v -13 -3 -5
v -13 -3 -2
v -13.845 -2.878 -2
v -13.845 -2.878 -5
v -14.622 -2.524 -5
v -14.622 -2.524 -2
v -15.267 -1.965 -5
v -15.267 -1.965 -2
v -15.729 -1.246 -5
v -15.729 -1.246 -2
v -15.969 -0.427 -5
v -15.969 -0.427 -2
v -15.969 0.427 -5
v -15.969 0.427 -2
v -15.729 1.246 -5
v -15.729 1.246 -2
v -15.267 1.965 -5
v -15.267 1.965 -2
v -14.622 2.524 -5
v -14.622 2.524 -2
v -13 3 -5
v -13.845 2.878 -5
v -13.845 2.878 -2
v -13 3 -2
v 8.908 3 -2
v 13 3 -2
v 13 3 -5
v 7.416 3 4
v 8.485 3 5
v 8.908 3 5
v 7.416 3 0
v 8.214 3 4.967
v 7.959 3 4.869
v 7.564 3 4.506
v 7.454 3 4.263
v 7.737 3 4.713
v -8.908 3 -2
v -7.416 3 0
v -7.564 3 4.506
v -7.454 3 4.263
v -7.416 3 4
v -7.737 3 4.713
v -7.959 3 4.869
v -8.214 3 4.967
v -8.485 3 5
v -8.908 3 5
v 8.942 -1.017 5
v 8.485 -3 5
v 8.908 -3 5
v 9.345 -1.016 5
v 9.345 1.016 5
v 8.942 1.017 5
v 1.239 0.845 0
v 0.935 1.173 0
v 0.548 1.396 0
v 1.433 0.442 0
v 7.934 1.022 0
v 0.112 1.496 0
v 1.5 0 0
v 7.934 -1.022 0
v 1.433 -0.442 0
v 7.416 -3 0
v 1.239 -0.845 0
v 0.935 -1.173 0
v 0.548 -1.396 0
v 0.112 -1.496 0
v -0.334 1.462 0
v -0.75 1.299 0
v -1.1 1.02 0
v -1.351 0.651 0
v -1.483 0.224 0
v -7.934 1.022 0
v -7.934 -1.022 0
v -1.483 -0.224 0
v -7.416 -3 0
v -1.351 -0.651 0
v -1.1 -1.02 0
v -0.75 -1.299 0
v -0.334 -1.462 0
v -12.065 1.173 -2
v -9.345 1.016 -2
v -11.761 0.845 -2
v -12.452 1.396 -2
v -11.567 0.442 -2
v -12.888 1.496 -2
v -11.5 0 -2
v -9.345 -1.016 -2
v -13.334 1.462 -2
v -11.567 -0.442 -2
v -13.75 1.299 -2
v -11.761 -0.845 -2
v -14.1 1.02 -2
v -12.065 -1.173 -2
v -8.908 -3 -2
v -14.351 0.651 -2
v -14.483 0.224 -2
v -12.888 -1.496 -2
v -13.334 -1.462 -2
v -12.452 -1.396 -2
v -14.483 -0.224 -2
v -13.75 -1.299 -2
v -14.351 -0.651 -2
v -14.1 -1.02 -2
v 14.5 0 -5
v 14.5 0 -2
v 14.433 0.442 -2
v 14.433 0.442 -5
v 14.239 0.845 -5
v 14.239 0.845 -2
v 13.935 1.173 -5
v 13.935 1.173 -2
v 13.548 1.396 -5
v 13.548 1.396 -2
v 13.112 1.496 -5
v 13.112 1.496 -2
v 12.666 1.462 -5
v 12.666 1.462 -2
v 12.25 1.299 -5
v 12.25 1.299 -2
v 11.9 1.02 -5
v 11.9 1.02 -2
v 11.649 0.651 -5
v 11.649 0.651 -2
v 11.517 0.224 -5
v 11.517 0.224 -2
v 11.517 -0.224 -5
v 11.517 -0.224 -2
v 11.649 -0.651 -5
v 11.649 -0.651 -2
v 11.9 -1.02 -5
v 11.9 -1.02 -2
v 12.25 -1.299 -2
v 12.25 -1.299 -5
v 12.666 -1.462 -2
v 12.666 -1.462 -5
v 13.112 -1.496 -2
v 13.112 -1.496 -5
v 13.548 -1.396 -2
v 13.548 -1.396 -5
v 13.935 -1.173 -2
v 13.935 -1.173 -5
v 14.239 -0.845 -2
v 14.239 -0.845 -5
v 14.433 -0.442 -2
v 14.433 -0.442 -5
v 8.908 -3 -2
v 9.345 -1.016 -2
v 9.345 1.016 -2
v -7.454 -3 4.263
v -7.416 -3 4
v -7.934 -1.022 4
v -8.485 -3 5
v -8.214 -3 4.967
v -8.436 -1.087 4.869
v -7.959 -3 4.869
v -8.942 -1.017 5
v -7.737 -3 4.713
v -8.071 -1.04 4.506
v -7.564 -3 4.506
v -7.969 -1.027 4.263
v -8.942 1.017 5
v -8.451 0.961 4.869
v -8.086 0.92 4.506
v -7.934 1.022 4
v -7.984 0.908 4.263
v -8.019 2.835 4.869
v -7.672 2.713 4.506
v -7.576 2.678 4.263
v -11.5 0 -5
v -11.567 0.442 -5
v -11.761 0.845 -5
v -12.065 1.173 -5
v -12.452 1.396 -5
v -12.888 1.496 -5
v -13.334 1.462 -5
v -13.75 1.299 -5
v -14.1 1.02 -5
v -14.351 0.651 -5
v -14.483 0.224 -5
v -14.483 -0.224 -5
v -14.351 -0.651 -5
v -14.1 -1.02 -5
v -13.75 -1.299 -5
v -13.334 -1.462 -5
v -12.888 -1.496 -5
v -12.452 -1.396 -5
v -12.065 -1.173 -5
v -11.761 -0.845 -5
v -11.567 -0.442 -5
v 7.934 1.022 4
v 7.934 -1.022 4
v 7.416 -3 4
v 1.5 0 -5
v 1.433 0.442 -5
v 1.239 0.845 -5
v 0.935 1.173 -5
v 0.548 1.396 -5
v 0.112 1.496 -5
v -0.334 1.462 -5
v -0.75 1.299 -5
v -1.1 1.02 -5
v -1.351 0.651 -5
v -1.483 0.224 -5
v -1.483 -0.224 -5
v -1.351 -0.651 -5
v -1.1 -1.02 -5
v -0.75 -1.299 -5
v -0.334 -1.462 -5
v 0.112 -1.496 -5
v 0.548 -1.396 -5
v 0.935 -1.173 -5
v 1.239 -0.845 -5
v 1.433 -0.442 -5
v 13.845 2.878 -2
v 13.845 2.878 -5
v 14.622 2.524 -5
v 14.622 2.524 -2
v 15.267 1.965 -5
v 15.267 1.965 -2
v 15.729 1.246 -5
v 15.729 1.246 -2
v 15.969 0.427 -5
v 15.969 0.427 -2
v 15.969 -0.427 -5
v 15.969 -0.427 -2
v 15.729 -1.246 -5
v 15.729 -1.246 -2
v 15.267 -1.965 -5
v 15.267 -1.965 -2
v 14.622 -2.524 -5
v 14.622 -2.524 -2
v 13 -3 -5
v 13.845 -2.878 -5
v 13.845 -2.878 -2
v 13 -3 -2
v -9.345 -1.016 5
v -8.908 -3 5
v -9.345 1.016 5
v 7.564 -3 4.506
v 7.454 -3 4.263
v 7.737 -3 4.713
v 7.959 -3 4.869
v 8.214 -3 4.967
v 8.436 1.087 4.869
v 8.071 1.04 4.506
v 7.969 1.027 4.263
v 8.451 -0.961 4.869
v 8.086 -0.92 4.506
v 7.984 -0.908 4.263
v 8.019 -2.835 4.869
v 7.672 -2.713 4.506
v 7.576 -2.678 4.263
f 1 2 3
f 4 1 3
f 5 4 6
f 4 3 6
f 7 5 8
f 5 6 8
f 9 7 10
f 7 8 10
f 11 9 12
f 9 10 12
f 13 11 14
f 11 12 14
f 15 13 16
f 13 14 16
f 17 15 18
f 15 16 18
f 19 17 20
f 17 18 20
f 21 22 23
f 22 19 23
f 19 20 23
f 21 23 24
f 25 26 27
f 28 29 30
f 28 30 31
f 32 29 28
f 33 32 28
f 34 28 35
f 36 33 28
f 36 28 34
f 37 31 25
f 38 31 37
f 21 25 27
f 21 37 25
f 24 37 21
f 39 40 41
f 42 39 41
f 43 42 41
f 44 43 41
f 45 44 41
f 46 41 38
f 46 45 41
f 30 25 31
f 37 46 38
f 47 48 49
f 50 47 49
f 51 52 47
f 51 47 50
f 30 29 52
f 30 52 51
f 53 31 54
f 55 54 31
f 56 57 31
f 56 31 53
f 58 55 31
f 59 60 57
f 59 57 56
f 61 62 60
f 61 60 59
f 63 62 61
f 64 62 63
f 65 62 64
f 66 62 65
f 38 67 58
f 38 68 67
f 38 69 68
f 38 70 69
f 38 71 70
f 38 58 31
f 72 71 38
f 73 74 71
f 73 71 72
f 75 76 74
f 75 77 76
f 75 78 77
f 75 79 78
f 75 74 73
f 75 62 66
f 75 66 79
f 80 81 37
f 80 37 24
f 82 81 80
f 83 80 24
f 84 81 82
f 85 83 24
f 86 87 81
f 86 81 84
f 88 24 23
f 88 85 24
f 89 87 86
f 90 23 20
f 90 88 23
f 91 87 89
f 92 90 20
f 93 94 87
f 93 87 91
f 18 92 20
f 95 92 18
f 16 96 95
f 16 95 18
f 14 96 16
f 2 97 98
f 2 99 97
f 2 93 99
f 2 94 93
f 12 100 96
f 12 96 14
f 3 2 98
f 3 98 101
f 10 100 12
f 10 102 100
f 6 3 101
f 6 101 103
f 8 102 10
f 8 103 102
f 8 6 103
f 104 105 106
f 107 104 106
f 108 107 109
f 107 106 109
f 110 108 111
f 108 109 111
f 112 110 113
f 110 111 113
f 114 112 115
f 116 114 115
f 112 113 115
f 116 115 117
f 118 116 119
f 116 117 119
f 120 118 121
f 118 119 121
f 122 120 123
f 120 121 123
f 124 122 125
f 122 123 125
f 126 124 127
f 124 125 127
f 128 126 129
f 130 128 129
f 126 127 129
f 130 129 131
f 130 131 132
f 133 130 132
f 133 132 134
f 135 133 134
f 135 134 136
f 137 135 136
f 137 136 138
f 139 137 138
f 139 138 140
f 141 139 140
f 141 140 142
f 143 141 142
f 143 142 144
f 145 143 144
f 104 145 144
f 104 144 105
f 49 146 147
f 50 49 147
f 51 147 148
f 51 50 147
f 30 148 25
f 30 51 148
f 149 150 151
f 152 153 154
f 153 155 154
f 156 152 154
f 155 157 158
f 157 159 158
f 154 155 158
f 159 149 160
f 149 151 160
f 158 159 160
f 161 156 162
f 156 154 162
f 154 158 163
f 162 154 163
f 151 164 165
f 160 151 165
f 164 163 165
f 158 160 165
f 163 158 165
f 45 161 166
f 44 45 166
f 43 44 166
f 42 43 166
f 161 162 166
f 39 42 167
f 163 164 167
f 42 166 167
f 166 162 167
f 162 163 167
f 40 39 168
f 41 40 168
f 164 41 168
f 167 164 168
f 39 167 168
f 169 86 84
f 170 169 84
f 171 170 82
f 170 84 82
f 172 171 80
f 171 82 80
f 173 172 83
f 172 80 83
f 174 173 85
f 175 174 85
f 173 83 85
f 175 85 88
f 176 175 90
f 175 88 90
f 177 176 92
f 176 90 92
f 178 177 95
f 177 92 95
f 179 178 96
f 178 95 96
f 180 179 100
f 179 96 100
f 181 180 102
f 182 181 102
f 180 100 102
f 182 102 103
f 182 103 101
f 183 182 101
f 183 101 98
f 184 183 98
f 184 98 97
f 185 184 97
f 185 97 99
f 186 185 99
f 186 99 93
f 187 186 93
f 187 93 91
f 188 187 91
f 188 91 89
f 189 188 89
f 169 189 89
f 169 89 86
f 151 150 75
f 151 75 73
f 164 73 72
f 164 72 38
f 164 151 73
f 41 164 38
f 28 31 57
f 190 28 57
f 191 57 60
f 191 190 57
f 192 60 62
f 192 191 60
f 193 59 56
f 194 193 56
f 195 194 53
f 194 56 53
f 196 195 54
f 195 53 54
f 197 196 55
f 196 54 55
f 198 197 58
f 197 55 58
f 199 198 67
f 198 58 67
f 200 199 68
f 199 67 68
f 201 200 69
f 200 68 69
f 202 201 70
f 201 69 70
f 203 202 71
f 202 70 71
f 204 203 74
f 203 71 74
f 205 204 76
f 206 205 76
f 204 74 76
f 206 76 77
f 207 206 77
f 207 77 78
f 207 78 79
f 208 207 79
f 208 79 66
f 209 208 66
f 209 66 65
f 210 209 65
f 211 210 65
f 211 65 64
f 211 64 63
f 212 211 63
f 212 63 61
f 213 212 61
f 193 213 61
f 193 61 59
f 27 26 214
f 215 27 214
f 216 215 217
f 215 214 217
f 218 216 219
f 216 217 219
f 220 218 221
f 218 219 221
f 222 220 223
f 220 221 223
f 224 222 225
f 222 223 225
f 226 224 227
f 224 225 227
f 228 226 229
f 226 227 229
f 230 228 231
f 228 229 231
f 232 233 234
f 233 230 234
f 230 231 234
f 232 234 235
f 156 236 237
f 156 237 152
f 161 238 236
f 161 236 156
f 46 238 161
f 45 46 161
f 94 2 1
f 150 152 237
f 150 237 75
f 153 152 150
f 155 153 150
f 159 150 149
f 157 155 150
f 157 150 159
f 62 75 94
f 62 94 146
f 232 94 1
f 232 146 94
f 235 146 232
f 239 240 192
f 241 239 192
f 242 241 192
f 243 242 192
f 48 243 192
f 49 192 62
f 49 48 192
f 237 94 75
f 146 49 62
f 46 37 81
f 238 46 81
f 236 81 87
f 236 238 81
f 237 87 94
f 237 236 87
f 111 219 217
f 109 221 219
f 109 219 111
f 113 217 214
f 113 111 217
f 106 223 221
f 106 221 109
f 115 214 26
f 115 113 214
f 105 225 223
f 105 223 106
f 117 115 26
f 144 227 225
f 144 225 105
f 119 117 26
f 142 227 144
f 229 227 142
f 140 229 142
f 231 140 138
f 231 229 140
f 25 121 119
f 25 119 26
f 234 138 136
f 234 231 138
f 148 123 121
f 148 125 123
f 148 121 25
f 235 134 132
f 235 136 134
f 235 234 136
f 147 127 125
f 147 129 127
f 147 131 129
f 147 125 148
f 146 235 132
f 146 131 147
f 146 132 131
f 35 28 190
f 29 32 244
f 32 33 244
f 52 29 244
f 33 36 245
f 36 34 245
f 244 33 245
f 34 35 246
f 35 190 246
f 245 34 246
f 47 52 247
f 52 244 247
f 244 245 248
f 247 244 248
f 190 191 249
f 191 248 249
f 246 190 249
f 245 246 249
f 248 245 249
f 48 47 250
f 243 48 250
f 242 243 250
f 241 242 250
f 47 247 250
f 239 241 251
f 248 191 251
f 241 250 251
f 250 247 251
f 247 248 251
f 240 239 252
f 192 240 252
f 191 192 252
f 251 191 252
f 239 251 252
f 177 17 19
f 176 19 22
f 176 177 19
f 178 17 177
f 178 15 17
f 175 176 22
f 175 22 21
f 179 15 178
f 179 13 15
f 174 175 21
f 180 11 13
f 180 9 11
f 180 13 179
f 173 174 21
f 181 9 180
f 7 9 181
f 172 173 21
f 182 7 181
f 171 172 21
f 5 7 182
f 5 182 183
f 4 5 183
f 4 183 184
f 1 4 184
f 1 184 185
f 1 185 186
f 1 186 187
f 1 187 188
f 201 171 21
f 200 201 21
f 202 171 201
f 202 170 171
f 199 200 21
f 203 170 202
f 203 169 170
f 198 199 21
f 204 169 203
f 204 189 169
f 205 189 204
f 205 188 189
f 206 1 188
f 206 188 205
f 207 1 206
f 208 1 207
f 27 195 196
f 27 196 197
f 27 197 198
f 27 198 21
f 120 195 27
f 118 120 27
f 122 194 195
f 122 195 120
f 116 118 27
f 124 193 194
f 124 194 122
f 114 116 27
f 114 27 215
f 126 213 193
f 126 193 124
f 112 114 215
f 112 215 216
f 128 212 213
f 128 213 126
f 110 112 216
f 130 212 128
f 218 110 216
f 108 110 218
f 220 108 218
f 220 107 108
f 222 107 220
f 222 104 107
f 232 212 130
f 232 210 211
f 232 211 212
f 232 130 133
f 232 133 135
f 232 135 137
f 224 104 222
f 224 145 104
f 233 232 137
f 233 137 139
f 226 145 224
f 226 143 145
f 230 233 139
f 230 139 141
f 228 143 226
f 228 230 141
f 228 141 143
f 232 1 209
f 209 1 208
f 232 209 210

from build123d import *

# Parameters (mm, degrees)
SKETCH_2_W          = 49.66242786768973
SKETCH_2_H          = 43.948008528228435
CUT_EXTRUDE_1_DEPTH = 10
SKETCH_3_R          = 1.5
SKETCH_3_R_2        = 1.5000000000000007
SKETCH_3_R_3        = 1.5000000000000004
CUT_EXTRUDE_2_DEPTH = 18.029386365926428
EXTRUDE_START       = 5
EXTRUDE_2_DEPTH     = 5
FILLET_2_R          = 1


with BuildPart() as part:
    # 草图1 → 旋转3 (revolve)
    with BuildSketch(Plane(origin=(0, 0, 0), x_dir=(1, 0, 0), z_dir=(0, 1, 0)), mode=Mode.PRIVATE) as revolve_3_sk:
        Polygon((0, 0), (0, 5.000000000000001), (20, 5.000000000000001), (20, 2.0000000000000018), (9.4, 2.0000000000000004), (9.4, 2.6e-16), align=None)
    revolve(revolve_3_sk.sketch.rotate(Axis((0, 0, 0), (0, 0, 1)), 180), axis=Axis((0, 0, 0), (0, 0, 1)))

    # 草图2 → 切除-拉伸1 (cut)
    with BuildSketch(Plane.XY):
        Rectangle(SKETCH_2_W, SKETCH_2_H)
        with BuildLine():
            Line((13, -2.999999999999997), (-13, -3))
            ThreePointArc((-13, -3), (-16, 3.7e-16), (-13, 3))
            Line((-13, 3), (13, 3.000000000000003))
            ThreePointArc((13, 3.000000000000003), (16, 3.18e-15), (13, -2.999999999999997))
        make_face(mode=Mode.SUBTRACT)
    extrude(amount=-CUT_EXTRUDE_1_DEPTH, mode=Mode.SUBTRACT)

    # 草图3 → 切除-拉伸2 (cut, through all)
    with BuildSketch(Plane.XY):
        Circle(SKETCH_3_R)
        with Locations((12.999999999999998, 0)):
            Circle(SKETCH_3_R_2)
        with Locations((-13.000000000000002, 0)):
            Circle(SKETCH_3_R_3)
    extrude(amount=-CUT_EXTRUDE_2_DEPTH, mode=Mode.SUBTRACT)

    # 草图5 → 凸台-拉伸2 (add)
    with BuildSketch(Plane.XY.offset(EXTRUDE_START)):
        with BuildLine():
            Line((-7.416198487095722, 3.0000000000000004), (-8.908422980528035, 3.0000000000000004))
            ThreePointArc((-8.908422980528037, 3.000000000000001), (-9.400000000000002, 5.6e-16), (-8.90842298052804, -3))
            Line((-8.908422980528037, -2.9999999999999996), (-7.416198487095721, -2.9999999999999996))
            ThreePointArc((-7.416198487095696, -2.9999999999999187), (-8, 9.8e-16), (-7.416198487095695, 2.9999999999999205))
        make_face()
        with BuildLine():
            Line((8.908422980528035, 3.000000000000002), (7.41619848709553, 3.000000000000002))
            ThreePointArc((7.416198487095587, 3.000000000000189), (7.852693419991789, 1.5281380996551506), (8, 0))
            ThreePointArc((8, -1.96e-15), (7.85269341999179, -1.5281380996551457), (7.416198487095591, -3.0000000000001785))
            Line((7.416198487095535, -2.999999999999998), (8.908422980528037, -2.999999999999998))
            ThreePointArc((8.908422980528037, -2.999999999999998), (9.400000000000002, 1.67e-15), (8.908422980528037, 3.0000000000000018))
        make_face()
    extrude(amount=-EXTRUDE_2_DEPTH)

    # 圆角2
    fillet_2_edges = [part.edges().sort_by_distance(p)[0] for p in [
        (-8.000000000000002, 1.22e-15, 5),
        (8, 6.72e-15, 5),
    ]]
    fillet(fillet_2_edges, radius=FILLET_2_R)


solid = part.part
